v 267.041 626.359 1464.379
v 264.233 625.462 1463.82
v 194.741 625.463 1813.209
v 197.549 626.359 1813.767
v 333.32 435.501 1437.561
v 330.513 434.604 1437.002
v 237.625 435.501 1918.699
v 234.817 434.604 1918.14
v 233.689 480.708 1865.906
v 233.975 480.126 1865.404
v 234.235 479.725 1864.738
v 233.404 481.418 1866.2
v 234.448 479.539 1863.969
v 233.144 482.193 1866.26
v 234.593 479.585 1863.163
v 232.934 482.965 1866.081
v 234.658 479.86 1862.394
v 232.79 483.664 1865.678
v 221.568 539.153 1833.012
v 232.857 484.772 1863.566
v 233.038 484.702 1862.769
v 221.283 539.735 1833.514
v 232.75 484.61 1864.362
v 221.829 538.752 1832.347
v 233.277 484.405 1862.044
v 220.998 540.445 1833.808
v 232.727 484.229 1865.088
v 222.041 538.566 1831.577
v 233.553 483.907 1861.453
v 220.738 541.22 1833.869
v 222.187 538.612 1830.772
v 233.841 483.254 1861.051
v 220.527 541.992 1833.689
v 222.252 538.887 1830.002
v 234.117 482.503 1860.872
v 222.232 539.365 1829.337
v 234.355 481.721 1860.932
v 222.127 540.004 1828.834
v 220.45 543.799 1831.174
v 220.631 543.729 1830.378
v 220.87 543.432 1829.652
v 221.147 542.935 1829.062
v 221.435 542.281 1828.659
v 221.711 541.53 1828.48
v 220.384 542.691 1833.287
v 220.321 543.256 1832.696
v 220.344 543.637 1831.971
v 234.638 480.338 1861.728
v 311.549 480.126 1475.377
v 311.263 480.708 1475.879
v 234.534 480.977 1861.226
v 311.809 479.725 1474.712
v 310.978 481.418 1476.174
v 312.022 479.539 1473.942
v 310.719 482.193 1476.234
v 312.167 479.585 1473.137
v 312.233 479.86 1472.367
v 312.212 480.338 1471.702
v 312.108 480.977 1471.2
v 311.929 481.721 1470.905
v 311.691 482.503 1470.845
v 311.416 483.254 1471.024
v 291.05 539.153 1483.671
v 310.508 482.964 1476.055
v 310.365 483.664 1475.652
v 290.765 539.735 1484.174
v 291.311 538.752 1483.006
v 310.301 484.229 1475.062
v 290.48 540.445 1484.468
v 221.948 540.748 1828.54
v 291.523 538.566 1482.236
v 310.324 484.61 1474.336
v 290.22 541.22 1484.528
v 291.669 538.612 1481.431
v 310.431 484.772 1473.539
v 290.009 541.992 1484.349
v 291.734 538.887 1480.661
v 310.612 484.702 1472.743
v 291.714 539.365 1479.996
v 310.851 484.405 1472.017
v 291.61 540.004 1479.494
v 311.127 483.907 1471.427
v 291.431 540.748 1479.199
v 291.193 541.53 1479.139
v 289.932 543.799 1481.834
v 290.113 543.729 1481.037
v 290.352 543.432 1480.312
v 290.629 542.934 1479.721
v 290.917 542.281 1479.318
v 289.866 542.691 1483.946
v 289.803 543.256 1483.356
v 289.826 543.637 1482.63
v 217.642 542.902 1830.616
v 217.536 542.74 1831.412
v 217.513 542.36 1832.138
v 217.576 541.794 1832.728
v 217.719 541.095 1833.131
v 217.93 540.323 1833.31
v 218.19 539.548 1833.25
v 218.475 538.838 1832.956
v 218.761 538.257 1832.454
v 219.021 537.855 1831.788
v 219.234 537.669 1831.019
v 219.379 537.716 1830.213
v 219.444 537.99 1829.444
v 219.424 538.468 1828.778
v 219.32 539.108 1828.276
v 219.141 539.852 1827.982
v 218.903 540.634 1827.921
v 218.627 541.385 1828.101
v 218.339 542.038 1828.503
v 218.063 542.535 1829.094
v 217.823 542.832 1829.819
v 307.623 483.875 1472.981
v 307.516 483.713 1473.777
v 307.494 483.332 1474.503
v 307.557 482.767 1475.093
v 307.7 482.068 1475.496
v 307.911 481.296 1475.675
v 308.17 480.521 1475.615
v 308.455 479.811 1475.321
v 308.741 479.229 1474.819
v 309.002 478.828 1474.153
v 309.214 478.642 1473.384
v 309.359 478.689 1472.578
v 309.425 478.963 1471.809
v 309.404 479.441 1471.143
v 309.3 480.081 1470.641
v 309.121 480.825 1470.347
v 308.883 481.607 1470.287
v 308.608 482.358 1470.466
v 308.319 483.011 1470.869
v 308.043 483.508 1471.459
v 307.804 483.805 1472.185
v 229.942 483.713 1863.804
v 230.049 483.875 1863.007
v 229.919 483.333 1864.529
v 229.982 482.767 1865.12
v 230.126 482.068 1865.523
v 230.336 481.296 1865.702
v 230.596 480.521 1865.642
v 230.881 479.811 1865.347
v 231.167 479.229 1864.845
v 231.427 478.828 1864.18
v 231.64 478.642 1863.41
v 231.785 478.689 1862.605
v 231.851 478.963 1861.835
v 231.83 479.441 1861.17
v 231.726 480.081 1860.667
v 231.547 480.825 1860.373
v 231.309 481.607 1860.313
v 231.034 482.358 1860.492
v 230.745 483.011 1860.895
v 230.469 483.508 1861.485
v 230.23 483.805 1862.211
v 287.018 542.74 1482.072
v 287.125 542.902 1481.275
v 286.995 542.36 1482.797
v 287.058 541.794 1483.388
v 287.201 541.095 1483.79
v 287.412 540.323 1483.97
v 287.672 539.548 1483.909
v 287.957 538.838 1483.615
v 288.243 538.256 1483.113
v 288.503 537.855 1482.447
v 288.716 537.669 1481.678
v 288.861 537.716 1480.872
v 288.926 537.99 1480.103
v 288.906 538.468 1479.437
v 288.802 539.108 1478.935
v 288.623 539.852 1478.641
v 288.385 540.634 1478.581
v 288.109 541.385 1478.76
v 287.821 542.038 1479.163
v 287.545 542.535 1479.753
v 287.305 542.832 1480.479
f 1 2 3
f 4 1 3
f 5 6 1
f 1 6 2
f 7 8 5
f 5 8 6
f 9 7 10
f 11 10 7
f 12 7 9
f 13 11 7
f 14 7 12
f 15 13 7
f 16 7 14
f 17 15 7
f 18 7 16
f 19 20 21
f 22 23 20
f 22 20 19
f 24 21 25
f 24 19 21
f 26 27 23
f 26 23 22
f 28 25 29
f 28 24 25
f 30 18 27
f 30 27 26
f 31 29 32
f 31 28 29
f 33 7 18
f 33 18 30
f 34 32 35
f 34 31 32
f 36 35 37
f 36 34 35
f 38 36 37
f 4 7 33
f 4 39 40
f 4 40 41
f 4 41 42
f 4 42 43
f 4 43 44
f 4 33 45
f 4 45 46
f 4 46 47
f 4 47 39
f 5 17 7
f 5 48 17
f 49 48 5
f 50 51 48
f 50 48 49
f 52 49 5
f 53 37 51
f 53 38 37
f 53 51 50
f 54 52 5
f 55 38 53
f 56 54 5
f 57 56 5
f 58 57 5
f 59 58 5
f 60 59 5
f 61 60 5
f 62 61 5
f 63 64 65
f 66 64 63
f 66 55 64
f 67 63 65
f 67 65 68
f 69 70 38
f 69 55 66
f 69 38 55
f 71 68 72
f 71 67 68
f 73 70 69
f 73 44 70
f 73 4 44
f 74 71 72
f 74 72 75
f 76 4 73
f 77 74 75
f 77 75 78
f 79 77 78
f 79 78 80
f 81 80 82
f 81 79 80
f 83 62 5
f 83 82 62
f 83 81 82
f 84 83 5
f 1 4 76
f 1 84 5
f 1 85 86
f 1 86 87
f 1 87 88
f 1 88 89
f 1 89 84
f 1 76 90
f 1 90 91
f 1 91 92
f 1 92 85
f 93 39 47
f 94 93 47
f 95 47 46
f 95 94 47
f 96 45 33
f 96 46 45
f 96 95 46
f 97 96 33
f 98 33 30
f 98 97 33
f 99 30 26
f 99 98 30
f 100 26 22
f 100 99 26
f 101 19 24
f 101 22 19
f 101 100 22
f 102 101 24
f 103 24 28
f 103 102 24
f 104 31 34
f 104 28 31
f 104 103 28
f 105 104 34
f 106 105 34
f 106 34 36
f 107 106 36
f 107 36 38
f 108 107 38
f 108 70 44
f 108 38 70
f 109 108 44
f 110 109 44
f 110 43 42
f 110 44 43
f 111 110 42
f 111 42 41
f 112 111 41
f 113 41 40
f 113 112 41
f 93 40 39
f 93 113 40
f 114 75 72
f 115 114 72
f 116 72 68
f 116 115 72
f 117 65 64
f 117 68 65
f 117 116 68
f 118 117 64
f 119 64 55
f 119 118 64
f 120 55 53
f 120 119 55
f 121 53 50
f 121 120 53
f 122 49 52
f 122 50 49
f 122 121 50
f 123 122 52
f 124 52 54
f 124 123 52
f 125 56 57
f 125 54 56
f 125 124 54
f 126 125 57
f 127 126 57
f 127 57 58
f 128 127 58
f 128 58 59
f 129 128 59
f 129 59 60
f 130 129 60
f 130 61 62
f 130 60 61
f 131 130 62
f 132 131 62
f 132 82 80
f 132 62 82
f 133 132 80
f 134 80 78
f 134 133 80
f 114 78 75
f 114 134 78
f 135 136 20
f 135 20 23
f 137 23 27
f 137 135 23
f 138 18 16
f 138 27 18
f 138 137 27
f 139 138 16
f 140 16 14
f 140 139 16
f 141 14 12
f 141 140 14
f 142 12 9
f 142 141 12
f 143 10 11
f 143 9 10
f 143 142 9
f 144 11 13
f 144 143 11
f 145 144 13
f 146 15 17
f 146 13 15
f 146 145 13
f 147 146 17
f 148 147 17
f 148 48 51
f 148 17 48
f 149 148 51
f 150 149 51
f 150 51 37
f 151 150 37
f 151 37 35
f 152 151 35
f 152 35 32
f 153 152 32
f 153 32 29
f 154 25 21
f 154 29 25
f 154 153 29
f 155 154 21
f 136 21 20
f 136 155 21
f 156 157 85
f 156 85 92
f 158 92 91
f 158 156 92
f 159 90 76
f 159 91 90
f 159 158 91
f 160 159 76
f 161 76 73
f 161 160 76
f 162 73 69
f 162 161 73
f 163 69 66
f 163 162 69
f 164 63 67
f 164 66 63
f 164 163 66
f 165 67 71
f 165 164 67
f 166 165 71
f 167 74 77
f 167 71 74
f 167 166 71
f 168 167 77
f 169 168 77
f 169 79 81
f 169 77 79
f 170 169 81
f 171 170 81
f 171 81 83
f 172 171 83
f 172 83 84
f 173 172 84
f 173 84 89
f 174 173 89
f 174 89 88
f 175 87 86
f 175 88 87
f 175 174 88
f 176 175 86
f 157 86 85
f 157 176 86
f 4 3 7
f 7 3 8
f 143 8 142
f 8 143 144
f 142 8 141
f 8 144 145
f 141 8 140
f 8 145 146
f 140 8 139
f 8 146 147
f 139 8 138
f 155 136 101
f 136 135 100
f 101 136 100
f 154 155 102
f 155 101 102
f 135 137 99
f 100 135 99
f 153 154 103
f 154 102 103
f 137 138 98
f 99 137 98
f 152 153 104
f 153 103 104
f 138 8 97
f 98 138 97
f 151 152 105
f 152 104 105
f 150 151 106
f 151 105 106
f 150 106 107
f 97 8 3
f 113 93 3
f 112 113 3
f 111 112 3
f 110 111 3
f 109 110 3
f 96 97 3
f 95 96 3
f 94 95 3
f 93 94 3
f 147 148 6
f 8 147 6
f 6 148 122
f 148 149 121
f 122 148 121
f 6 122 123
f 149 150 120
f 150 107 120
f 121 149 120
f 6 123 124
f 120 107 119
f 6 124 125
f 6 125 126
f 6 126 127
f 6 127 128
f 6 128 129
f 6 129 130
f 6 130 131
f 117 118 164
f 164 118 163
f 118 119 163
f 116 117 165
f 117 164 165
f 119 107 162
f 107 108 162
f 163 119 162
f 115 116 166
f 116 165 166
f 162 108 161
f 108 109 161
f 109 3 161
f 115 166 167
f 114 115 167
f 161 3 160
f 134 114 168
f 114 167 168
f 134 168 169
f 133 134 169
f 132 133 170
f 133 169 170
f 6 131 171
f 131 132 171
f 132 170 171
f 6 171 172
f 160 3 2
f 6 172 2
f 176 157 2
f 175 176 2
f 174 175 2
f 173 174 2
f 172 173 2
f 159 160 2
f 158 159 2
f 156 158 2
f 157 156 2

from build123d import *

# Parameters (mm, degrees)
BOSS_EXTRUDE1_DEPTH     = 3
CUT_EXTRUDE1_DEPTH      = 1894.152557487
CUT_EXTRUDE1_DEPTH_BACK = 1894.152557487
SKETCH3_R               = 2.75


with BuildPart() as part:
    # Sketch1 → Boss-Extrude1 (new body)
    with BuildSketch(Plane(origin=(661.48611704, 211.228421756, 131.566142626), x_dir=(0.17733557040624817, 0.05662751143705051, -0.9825199338523047), z_dir=(0.9359591821601212, 0.2988742708017776, 0.1861574053935612))):
        Polygon((-1711.561008488, 536.583768948), (-1818.35898353, 342.579279309), (-1328.661052703, 313.46937198), (-1355.956557086, 515.444997525), align=None)
    extrude(amount=BOSS_EXTRUDE1_DEPTH)

    # Sketch3 → Cut-Extrude1 (cut, two sides: drawn at the far end of the back side and taken through both)
    with BuildSketch(Plane(origin=(661.48611704, 211.228421756, 131.566142626), x_dir=(0.17733557040624817, 0.05662751143705051, -0.9825199338523047), z_dir=(0.9359591821601212, 0.2988742708017776, 0.1861574053935612)).offset(-CUT_EXTRUDE1_DEPTH_BACK)):
        with Locations(Location((-1729.277570286, 448.219803938, 0), (0, 0, 90))):
            Circle(SKETCH3_R)
        with Locations(Location((-1762.245431769, 388.21613765, 0), (0, 0, 90))):
            Circle(SKETCH3_R)
        with Locations(Location((-1365.280056563, 364.618681835, 0), (0, 0, 90))):
            Circle(SKETCH3_R)
        with Locations(Location((-1373.721769773, 427.083924548, 0), (0, 0, 90))):
            Circle(SKETCH3_R)
    extrude(amount=CUT_EXTRUDE1_DEPTH + CUT_EXTRUDE1_DEPTH_BACK, mode=Mode.SUBTRACT)


solid = part.part
